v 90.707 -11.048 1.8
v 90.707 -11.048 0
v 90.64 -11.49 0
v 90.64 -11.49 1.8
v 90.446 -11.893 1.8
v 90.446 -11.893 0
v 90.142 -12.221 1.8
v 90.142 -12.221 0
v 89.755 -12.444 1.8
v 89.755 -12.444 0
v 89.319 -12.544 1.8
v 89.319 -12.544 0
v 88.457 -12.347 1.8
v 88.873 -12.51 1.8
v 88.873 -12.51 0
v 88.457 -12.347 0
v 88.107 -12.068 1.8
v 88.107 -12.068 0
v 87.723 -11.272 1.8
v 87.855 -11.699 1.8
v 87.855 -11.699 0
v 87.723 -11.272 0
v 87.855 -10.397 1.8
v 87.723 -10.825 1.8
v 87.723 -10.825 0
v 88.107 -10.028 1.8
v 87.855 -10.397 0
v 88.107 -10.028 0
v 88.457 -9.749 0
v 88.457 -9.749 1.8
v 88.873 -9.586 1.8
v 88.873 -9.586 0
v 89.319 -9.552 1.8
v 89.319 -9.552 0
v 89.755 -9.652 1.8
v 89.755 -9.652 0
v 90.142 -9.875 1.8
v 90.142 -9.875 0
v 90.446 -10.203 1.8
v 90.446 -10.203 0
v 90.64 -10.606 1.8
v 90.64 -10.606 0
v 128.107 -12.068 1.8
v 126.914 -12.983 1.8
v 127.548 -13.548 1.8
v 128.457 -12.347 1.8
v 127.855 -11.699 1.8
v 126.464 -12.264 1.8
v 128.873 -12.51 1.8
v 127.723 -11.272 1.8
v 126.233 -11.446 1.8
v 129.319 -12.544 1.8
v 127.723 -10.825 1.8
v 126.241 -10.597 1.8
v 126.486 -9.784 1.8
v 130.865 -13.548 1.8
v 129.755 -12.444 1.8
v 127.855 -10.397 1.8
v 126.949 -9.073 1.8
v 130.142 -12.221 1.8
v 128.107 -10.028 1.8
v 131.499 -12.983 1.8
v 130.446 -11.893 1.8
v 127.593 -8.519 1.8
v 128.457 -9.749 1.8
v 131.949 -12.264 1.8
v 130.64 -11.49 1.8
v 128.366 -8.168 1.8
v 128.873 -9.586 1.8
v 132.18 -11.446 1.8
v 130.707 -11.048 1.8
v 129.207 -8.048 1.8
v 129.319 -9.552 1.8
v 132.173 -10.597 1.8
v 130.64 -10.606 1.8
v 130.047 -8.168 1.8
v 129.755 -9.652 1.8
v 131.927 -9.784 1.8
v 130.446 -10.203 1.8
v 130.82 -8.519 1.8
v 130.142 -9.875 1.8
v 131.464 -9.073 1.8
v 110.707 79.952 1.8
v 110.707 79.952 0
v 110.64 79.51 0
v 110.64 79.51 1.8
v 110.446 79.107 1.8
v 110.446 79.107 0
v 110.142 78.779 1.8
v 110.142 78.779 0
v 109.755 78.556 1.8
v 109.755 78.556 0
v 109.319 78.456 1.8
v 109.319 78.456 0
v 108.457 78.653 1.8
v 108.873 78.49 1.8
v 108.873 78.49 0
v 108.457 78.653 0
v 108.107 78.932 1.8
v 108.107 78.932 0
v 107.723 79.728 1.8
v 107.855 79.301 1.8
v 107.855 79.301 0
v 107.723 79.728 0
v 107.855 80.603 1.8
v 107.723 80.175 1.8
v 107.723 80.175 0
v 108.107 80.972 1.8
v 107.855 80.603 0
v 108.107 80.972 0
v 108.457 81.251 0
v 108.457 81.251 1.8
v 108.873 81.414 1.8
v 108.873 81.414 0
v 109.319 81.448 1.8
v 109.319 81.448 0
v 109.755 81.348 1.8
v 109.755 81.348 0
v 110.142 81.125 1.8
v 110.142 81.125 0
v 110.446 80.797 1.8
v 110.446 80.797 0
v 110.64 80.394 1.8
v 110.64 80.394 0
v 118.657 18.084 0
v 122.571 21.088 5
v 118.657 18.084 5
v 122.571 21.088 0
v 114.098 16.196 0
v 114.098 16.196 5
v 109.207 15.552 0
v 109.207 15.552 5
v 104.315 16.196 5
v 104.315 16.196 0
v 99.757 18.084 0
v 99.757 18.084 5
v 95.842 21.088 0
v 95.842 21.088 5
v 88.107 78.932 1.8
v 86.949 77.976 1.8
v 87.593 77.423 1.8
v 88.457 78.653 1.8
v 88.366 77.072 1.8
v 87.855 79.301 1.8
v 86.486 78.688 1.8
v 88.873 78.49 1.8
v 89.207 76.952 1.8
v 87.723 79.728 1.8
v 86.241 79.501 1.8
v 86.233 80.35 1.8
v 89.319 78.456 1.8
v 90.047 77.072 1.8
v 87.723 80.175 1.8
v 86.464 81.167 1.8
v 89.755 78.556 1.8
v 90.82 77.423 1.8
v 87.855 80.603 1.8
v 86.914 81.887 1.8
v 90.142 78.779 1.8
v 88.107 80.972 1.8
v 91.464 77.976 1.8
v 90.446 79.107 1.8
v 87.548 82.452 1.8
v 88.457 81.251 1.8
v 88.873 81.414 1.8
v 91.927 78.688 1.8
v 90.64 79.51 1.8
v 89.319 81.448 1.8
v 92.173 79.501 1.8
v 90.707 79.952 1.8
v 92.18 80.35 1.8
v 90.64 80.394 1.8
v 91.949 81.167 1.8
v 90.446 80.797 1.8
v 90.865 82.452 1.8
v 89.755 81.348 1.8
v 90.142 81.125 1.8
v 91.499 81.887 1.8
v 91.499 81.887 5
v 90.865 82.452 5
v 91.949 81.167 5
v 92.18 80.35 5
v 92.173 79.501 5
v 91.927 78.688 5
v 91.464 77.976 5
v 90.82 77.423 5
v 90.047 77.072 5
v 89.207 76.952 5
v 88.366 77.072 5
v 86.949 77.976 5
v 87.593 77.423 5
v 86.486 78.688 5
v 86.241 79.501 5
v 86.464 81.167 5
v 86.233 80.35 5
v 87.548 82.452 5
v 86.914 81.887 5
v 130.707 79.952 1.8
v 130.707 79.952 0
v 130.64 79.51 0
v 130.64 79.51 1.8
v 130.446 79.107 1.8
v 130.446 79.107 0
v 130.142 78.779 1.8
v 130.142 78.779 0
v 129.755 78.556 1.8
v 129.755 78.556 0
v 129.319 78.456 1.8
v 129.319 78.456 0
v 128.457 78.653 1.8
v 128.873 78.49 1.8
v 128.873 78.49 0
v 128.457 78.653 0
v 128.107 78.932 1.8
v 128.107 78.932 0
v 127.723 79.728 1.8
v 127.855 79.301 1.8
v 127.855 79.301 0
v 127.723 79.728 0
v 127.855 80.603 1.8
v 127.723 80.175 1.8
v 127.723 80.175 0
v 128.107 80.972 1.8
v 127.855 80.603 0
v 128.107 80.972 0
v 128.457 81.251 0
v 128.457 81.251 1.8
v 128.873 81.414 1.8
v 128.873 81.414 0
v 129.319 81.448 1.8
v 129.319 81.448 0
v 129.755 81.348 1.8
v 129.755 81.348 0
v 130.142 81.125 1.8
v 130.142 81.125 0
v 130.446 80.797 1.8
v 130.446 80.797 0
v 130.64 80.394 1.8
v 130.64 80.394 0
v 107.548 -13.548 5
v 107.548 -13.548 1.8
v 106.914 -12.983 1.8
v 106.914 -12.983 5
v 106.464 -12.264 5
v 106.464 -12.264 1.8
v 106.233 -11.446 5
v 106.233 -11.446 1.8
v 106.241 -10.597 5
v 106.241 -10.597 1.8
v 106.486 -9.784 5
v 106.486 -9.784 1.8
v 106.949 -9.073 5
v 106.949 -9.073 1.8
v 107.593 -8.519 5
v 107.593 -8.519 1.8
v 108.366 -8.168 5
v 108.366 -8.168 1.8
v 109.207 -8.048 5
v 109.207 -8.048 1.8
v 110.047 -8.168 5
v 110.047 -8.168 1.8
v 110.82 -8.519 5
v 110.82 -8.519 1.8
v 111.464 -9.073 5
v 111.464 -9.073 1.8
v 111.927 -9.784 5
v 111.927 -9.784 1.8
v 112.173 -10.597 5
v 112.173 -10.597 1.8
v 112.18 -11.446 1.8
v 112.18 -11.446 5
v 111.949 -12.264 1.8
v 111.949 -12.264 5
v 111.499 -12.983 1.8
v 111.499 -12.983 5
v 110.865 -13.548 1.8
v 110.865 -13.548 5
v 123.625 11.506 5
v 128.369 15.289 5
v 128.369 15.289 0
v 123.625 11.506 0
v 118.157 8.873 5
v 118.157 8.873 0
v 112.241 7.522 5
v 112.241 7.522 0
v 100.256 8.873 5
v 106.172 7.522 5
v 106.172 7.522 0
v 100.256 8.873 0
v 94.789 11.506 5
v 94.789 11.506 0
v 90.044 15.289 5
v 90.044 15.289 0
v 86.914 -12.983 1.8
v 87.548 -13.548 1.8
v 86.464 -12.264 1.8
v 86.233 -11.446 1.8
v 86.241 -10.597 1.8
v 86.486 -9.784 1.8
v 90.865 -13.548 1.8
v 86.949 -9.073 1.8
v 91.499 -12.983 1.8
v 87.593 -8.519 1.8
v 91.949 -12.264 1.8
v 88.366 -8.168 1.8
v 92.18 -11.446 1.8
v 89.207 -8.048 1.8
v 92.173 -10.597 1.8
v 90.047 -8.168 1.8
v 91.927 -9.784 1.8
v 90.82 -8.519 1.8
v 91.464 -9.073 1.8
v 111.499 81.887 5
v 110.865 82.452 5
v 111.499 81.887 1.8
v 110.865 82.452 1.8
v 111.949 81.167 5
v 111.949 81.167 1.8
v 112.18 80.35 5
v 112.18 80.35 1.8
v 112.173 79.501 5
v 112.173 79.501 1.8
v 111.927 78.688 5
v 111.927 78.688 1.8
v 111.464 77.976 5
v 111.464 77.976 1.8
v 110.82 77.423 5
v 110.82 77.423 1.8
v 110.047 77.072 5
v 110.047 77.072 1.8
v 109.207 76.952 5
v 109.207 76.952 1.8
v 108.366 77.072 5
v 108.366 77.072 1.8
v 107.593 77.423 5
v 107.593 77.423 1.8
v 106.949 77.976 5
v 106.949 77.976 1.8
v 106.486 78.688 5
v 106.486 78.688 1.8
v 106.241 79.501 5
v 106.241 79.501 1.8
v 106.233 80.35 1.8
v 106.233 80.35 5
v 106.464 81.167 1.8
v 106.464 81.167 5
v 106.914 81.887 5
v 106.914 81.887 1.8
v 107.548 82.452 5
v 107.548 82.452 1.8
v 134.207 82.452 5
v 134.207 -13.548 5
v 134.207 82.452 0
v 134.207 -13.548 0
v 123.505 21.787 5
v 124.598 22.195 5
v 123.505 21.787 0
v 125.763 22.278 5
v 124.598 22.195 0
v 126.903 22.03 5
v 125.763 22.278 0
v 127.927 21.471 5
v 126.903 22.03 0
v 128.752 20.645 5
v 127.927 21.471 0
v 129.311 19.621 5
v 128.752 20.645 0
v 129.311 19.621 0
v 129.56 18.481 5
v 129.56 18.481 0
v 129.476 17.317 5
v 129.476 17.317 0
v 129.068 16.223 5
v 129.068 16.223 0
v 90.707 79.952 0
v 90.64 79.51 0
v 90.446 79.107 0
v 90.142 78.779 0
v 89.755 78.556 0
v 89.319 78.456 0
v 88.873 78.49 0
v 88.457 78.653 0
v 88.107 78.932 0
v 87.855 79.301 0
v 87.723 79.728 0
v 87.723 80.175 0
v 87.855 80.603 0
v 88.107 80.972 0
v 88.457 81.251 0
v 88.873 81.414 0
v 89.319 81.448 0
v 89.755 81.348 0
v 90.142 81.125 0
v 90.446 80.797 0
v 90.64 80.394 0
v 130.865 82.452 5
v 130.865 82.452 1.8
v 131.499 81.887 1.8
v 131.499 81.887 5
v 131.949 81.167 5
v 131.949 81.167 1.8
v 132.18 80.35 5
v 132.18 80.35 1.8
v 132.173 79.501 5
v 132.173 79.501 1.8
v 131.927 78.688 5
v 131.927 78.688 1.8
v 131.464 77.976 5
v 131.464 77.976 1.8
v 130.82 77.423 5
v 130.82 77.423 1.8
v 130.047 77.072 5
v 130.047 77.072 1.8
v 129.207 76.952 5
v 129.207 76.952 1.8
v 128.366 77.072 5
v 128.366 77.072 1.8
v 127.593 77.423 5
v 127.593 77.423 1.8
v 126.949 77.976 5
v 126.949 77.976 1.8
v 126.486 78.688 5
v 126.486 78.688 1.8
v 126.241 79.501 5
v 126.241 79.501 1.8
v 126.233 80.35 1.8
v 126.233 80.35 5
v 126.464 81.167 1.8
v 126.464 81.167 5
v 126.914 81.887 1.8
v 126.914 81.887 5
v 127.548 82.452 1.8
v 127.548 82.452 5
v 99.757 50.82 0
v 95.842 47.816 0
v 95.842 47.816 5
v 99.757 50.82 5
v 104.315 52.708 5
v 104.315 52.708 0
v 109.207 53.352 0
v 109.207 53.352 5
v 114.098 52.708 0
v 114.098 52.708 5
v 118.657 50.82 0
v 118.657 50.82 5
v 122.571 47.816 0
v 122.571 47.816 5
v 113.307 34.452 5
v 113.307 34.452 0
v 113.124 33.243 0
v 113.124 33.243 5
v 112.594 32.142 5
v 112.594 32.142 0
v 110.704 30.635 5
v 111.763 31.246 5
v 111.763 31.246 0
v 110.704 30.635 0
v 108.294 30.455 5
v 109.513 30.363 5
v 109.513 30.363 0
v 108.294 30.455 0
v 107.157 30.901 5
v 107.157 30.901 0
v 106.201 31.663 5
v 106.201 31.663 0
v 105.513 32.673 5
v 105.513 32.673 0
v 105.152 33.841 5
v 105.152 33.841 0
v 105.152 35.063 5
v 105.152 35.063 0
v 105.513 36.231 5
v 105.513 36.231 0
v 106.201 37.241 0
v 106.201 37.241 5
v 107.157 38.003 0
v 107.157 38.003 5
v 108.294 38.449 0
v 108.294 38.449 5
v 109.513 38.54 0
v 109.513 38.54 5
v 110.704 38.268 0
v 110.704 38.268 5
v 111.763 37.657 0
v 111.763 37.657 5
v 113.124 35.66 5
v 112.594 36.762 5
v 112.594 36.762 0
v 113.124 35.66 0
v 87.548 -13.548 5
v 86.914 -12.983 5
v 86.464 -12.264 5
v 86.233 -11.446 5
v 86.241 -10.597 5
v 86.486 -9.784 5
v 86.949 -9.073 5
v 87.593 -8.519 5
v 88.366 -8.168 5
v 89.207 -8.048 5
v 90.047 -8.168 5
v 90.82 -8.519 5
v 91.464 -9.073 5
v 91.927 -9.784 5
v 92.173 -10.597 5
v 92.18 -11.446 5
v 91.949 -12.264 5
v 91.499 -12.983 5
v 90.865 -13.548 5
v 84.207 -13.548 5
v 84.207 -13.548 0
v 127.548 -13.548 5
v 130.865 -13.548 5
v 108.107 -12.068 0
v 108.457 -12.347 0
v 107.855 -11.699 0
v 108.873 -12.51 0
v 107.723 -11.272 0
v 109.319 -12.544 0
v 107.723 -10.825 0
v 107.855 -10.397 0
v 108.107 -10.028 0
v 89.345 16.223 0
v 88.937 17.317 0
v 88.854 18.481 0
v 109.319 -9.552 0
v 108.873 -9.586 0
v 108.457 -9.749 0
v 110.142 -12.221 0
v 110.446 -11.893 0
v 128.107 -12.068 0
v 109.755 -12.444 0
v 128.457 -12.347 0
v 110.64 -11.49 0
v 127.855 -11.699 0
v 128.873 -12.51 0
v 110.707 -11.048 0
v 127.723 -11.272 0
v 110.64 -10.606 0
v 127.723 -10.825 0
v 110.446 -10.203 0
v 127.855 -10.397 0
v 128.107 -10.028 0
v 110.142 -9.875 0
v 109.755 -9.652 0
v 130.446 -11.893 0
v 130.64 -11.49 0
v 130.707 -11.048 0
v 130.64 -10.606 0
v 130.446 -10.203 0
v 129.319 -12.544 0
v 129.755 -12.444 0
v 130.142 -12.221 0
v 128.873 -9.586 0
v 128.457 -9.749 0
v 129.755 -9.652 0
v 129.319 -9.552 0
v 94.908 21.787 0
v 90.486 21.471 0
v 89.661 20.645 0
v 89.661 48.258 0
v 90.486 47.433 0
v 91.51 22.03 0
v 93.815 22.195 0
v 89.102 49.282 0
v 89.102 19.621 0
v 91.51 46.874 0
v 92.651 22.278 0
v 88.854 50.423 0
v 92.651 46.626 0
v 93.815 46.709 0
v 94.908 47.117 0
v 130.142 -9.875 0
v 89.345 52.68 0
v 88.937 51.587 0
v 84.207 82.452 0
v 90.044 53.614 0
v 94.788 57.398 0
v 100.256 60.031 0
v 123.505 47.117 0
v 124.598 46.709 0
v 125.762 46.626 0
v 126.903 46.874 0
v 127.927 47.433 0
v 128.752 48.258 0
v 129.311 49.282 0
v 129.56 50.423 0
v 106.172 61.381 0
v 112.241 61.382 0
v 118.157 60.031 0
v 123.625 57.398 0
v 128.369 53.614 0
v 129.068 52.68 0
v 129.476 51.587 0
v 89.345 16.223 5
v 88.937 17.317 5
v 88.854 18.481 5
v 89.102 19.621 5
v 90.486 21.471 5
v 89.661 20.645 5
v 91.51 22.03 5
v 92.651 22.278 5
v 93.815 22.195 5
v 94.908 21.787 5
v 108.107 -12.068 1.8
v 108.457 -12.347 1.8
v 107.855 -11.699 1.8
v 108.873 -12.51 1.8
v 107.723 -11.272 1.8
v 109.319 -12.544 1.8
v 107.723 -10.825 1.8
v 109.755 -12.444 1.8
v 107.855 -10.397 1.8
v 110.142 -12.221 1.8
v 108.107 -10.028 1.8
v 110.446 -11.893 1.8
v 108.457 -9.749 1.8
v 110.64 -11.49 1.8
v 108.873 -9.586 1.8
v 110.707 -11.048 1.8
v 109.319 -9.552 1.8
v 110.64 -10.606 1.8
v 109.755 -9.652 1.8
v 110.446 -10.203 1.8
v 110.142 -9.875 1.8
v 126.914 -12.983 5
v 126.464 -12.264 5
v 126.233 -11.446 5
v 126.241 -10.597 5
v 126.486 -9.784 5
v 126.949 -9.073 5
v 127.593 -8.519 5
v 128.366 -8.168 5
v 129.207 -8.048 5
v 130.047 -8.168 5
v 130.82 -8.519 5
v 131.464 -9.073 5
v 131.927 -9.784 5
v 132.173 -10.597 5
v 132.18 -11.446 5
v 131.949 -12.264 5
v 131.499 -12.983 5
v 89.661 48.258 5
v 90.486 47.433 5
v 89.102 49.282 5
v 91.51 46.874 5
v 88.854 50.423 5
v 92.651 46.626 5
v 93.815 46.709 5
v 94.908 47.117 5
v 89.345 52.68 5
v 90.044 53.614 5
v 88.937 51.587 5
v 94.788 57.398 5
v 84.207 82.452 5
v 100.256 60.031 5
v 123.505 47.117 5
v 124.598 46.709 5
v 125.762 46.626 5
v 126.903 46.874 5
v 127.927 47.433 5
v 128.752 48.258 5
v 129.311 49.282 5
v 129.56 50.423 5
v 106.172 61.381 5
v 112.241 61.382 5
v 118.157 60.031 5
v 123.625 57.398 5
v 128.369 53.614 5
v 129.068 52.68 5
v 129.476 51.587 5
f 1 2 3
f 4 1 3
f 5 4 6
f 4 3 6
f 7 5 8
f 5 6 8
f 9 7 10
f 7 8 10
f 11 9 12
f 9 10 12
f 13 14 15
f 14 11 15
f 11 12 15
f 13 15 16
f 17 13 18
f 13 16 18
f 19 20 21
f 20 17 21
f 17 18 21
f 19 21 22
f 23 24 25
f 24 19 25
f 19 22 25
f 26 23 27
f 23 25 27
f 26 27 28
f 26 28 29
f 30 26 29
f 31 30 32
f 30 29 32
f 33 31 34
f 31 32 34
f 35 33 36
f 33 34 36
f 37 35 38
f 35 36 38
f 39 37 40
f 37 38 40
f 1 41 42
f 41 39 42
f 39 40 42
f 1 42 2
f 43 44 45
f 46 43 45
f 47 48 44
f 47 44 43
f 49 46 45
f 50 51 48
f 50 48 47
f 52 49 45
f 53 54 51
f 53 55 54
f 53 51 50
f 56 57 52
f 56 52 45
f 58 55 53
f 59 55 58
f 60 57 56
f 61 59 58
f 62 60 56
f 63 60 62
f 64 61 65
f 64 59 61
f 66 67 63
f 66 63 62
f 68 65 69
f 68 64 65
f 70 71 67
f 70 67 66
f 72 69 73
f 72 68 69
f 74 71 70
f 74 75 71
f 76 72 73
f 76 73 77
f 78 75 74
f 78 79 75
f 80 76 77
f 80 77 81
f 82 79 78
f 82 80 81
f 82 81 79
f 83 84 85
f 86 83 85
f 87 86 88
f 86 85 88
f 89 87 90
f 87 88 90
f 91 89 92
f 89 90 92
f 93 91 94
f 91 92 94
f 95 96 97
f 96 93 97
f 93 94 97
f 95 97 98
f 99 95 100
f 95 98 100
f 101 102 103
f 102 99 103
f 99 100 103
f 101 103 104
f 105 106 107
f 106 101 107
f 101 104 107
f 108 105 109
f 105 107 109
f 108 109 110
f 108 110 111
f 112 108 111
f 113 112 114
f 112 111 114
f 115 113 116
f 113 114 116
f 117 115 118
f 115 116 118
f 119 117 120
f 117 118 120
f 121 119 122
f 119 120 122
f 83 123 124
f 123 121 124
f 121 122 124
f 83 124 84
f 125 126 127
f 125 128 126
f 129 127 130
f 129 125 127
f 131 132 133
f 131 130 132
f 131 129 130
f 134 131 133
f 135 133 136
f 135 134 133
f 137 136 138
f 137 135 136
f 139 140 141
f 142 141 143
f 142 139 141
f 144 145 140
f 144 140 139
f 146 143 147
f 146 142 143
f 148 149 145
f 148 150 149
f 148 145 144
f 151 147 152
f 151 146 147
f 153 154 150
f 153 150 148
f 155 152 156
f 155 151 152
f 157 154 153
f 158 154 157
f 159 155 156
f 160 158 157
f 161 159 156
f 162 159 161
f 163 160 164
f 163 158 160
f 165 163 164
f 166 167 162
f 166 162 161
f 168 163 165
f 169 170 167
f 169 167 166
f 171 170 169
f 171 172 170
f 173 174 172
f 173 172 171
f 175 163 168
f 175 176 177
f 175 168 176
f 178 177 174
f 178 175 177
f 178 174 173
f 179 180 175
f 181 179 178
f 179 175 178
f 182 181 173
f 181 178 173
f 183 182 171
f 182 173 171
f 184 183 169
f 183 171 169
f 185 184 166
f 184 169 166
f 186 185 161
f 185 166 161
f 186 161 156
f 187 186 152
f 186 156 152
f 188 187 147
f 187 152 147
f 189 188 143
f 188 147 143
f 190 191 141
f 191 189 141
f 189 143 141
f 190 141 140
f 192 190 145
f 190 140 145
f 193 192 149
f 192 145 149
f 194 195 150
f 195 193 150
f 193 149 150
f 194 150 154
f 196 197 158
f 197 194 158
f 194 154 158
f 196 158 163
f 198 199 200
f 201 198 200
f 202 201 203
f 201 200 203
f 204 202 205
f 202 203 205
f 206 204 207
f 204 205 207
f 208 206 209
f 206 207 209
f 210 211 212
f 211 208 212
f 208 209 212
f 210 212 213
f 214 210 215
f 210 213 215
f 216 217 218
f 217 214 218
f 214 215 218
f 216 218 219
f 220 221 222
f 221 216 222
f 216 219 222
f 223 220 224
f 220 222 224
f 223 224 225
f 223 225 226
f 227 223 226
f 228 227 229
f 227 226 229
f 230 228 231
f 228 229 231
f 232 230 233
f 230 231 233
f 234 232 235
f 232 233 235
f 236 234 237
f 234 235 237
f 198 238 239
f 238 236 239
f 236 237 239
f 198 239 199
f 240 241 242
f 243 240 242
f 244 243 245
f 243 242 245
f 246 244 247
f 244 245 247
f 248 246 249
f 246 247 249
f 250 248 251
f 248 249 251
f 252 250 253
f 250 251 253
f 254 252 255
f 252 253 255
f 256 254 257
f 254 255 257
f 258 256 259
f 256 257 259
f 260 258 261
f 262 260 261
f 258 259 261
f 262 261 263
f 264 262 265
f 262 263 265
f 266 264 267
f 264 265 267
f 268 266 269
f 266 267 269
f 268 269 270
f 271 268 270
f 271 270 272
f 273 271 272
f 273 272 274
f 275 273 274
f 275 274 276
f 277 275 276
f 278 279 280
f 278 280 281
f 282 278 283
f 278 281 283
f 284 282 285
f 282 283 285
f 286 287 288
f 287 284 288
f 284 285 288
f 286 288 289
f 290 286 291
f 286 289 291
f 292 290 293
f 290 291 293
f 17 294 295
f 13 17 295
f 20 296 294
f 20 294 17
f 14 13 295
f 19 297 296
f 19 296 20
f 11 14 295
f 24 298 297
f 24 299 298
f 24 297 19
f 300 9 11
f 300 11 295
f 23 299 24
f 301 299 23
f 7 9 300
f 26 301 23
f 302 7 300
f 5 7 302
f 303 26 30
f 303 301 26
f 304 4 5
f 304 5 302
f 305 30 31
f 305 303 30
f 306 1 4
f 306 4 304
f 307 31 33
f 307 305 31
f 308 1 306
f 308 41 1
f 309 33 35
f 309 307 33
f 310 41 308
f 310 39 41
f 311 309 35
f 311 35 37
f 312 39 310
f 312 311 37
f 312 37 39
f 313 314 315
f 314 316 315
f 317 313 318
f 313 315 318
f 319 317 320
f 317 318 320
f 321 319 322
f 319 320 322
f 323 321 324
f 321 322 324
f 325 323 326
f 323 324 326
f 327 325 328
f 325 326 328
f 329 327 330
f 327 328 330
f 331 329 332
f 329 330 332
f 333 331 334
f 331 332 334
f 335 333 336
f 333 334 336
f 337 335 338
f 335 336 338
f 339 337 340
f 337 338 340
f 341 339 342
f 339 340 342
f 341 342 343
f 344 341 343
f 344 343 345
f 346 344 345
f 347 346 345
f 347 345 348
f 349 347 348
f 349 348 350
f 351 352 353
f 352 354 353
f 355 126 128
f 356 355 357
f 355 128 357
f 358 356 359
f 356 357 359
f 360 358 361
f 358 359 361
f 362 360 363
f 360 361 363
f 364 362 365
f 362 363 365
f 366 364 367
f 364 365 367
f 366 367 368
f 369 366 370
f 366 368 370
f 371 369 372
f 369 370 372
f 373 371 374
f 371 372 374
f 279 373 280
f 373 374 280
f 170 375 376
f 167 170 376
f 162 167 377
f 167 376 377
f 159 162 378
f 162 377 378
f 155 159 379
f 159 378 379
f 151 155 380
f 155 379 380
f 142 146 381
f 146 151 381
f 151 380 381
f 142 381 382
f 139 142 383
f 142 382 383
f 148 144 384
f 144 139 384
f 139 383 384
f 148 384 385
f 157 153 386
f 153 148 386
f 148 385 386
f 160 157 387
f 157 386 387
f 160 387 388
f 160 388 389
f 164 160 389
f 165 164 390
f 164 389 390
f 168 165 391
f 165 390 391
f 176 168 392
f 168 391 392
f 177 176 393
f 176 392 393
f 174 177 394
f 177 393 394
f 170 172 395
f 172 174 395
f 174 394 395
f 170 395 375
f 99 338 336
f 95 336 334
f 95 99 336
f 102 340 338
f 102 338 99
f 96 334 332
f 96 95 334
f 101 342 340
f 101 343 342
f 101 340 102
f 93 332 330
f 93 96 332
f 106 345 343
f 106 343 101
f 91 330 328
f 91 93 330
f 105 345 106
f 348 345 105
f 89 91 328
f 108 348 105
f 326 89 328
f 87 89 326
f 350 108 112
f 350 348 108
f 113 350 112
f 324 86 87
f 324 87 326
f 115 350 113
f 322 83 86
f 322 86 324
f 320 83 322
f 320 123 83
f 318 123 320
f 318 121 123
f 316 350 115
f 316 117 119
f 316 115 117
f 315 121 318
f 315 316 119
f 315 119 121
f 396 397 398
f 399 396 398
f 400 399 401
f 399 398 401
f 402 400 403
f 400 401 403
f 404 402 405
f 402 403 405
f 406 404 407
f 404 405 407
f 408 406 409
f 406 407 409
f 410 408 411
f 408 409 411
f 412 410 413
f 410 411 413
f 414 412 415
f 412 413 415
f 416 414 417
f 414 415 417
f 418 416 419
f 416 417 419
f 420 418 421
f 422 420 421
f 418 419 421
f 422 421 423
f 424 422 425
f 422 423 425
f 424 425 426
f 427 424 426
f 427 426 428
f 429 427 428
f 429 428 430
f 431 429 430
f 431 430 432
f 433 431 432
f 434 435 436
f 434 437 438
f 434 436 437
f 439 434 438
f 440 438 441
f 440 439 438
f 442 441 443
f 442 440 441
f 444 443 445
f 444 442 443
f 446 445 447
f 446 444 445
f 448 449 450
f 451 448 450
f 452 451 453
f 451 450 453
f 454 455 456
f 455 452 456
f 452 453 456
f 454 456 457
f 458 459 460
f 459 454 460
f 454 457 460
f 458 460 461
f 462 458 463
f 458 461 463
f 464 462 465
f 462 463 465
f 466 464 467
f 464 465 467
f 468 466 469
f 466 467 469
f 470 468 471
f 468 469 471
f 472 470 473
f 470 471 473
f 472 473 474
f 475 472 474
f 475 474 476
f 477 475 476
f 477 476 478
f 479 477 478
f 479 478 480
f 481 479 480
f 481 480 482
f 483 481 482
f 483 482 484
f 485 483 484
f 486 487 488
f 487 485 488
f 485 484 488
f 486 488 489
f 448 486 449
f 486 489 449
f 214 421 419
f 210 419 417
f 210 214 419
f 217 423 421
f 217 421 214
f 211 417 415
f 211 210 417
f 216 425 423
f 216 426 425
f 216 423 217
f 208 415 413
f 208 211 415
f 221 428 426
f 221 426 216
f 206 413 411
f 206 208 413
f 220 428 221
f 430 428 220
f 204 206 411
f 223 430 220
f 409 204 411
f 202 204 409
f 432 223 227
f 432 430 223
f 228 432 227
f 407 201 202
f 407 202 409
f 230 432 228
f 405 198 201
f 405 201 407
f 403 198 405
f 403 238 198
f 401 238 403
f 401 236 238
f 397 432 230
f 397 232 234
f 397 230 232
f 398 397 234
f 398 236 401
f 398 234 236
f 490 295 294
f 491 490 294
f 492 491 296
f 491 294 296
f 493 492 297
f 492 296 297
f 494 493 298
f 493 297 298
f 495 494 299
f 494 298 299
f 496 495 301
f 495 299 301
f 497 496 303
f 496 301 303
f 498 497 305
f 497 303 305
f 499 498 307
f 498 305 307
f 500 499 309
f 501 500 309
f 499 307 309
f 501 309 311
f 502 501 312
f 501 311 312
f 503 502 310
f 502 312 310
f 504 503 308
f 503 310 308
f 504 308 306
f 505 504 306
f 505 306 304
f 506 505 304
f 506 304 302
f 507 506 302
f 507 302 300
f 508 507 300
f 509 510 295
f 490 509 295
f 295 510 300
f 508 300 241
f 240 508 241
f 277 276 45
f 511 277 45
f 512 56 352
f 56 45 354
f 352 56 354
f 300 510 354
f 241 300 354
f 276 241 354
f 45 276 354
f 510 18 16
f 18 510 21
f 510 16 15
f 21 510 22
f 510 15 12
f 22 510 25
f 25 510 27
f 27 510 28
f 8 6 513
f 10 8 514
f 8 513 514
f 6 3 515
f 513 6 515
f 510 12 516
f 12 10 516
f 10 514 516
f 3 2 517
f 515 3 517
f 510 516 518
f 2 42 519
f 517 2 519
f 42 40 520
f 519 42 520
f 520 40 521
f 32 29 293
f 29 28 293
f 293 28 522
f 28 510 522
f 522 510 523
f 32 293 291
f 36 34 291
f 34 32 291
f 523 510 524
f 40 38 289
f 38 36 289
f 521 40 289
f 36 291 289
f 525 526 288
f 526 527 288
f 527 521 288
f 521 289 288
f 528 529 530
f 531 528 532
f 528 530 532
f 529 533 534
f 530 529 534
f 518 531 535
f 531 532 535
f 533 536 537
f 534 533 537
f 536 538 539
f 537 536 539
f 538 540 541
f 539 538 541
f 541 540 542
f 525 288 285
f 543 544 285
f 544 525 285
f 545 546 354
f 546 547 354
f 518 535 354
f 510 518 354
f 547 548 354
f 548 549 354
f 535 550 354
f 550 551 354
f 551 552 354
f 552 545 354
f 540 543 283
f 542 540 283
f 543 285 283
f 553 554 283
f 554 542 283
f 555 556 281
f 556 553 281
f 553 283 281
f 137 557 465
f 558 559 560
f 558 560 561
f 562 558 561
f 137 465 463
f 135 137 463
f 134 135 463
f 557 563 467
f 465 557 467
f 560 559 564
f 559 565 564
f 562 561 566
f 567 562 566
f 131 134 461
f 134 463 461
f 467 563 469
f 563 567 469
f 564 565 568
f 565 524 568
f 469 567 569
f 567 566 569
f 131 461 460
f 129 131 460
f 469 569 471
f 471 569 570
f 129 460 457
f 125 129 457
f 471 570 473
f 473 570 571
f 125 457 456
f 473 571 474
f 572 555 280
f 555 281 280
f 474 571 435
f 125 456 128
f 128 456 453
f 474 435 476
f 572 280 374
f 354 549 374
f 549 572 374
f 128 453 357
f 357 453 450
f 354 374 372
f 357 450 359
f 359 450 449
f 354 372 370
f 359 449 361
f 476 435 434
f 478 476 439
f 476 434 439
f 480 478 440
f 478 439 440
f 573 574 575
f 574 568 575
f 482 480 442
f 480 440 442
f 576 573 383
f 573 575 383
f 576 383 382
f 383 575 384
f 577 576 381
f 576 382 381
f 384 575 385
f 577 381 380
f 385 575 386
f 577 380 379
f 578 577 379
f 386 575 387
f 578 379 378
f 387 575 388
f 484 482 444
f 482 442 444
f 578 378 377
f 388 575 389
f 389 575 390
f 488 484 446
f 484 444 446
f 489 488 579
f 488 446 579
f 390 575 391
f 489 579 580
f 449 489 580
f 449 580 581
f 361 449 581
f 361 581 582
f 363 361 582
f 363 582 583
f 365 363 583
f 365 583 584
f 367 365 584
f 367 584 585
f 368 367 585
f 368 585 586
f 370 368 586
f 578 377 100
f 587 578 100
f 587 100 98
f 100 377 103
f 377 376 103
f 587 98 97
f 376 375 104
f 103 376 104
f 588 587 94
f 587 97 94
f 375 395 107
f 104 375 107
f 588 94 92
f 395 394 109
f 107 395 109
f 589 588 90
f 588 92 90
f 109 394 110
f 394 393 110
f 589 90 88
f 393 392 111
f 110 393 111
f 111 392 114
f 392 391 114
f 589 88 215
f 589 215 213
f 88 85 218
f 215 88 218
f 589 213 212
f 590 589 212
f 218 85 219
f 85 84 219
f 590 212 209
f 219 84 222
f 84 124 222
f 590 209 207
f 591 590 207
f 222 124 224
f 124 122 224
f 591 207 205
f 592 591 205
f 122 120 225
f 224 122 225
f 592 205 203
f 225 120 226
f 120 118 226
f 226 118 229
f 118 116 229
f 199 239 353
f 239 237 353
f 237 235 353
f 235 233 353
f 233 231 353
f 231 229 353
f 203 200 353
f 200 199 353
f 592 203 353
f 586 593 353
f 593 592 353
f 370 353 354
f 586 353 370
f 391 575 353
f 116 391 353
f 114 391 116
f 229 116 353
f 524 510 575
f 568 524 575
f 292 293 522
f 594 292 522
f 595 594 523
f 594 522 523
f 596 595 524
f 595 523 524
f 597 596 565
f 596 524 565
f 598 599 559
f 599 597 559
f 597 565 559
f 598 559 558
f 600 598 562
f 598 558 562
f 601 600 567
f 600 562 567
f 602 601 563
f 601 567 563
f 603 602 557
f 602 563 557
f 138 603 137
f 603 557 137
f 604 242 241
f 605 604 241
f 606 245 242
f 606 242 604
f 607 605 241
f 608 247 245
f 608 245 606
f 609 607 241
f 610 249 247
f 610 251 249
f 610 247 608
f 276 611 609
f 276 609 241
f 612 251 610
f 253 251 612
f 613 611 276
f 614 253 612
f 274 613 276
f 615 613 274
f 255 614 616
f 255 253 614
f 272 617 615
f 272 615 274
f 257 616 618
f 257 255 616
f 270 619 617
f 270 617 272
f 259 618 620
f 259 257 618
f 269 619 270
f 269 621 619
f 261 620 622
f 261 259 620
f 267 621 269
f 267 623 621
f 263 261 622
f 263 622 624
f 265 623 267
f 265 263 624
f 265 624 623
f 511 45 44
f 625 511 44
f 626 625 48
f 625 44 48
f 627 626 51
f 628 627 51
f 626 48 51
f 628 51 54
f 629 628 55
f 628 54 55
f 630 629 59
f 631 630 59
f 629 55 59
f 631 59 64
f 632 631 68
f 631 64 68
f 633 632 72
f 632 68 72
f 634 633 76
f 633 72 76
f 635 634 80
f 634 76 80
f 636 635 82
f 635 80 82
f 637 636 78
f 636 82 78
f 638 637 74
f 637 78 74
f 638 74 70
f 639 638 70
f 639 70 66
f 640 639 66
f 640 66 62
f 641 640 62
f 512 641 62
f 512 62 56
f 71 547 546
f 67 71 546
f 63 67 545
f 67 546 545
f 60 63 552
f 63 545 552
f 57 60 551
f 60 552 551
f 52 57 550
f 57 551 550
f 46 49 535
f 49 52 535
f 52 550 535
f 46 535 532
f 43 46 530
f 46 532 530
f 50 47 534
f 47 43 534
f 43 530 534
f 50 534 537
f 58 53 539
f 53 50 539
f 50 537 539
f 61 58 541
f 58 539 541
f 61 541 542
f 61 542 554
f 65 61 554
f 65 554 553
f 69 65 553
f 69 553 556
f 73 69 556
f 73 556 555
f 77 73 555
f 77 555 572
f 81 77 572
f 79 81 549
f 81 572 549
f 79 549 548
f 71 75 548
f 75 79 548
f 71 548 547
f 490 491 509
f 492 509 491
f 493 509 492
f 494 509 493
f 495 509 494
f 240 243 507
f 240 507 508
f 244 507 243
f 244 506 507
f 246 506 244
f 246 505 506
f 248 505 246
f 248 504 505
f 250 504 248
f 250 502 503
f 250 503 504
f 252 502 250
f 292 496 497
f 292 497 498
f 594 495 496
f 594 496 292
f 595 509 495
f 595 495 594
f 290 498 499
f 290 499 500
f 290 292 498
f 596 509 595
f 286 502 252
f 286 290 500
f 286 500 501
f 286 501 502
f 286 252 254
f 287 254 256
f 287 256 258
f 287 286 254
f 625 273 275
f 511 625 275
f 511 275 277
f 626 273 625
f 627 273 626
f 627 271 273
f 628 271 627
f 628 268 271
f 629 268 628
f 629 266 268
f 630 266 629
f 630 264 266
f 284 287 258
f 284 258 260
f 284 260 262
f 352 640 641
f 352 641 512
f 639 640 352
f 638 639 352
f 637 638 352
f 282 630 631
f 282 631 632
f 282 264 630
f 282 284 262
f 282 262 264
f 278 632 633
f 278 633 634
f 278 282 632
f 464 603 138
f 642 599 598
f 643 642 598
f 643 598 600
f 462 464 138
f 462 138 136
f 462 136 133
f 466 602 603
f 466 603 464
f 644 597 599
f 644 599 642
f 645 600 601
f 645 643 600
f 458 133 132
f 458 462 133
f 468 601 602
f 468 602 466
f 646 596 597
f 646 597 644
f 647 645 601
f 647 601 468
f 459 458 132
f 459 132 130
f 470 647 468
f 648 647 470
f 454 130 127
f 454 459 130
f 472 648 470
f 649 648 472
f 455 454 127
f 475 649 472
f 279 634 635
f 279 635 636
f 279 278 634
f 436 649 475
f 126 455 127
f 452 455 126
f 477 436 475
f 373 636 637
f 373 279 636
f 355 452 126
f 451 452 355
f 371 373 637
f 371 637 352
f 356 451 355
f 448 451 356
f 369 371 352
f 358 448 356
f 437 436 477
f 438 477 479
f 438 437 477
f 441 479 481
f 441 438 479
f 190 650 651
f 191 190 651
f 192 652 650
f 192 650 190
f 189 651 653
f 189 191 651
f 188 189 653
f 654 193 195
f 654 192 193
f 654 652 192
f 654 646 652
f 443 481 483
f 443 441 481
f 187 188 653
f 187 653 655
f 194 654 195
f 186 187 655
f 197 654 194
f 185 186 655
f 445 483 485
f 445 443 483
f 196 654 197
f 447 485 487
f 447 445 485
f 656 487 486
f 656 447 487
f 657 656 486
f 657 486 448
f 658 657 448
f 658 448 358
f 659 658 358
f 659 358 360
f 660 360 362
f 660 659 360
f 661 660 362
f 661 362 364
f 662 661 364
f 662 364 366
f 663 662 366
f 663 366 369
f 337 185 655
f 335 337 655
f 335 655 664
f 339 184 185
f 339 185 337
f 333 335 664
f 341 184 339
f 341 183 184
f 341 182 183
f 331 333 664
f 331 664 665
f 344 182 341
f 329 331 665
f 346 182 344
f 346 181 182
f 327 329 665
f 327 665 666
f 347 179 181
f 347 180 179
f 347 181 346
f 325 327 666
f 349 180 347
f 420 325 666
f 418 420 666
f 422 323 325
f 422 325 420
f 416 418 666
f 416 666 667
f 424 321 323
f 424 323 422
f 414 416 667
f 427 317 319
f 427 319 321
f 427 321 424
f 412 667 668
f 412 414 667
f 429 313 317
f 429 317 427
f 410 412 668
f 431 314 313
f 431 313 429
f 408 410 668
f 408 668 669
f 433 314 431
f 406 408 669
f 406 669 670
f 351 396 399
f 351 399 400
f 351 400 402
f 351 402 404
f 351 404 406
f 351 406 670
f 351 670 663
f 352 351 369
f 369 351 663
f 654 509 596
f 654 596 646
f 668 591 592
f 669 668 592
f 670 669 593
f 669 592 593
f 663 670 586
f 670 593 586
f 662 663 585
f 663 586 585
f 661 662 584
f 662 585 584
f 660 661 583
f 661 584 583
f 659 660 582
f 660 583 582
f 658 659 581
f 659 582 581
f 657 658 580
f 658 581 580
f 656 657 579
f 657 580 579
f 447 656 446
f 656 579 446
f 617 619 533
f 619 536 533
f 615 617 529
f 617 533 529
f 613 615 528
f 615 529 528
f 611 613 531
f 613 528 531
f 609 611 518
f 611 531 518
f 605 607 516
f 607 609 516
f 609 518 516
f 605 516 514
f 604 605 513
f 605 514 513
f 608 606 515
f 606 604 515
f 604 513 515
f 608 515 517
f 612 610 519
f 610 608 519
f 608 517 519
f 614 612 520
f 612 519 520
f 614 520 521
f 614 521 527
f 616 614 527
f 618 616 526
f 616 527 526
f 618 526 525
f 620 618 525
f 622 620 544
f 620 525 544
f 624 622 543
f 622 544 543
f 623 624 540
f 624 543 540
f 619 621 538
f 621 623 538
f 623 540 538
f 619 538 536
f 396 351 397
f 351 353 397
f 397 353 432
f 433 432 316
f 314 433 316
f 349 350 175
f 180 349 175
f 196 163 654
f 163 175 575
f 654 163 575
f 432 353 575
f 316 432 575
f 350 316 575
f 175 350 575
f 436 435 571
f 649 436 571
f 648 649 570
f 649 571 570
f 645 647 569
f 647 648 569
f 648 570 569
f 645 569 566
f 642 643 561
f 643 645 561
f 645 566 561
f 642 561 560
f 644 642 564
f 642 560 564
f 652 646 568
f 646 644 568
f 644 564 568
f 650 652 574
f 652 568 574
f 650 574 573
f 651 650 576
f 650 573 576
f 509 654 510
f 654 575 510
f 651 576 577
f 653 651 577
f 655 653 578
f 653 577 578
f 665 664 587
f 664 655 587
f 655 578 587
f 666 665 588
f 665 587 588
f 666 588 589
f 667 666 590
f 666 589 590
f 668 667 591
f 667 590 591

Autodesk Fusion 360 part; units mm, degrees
sketch "Schizzo5" plane through (0, 0, 0) normal (0, 0, 1) x (1, 0, 0)
  line L0 (84.2066, 82.4519) -> (84.2066, -13.5481)
  circle A0 centre (89.2066, -11.0481) radius 1.5
  circle A1 centre (129.2066, 79.9519) radius 3
  line L1 (84.2066, 34.4519) -> (134.2066, 34.4519) construction
  circle A2 centre (109.2066, 79.9519) radius 1.5
  circle A3 centre (89.2066, 79.9519) radius 3
  circle A4 centre (89.2066, 79.9519) radius 1.5
  line L2 (134.2066, 82.4519) -> (84.2066, 82.4519)
  circle A5 centre (129.2066, 79.9519) radius 1.5
  circle A6 centre (109.2066, 79.9519) radius 3
  circle A7 centre (109.2066, 34.4519) radius 4.1
  circle A8 centre (109.2066, -11.0481) radius 1.5
  line L3 (134.2066, -13.5481) -> (134.2066, 82.4519)
  line L4 (89.2066, 82.4519) -> (89.2066, -13.5481) construction
  circle A9 centre (89.2066, -11.0481) radius 3
  circle A10 centre (109.2066, -11.0481) radius 3
  circle A11 centre (129.2066, -11.0481) radius 1.5
  line L5 (84.2066, -13.5481) -> (134.2066, -13.5481)
  circle A12 centre (129.2066, -11.0481) radius 3
  line L6 (84.2066, -11.0481) -> (134.2066, -11.0481) construction
  line L7 (109.2066, 82.4519) -> (109.2066, -13.5481) construction
  line L8 (109.2066, 34.4519) -> (109.2066, 59.4519) construction
  line L9 (109.2066, 34.4519) -> (109.2066, 59.4519) construction
  line L10 (109.2066, 34.4519) -> (92.9431, 18.1884) construction
  circle A13 centre (92.9431, 18.1884) radius 4.1
  circle A14 centre (92.9431, 50.7153) radius 4.1
  circle A15 centre (125.47, 50.7153) radius 4.1
  circle A16 centre (125.47, 18.1884) radius 4.1
  circle A17 centre (109.2066, 34.4519) radius 18.9
  circle A18 centre (109.2066, 34.4519) radius 27.1
  point P0 (127.8474, 12.2366)
  dimension "d221" = 50
  dimension "d222" = 96
  dimension "d223" = 2.5
  dimension "d224" = 20
  dimension "d225" = 3
  dimension "d226" = 6
  dimension "d227" = 3
  dimension "d228" = 6
  dimension "d229" = 8.2
  dimension "d350" = 8.2
  dimension "d351" = 45
  dimension "d352" = 23
extrude "Estrusione24" add sketch "Schizzo5" along normal blind 5 contours L0 A1 A3 L2 A6 L3 A18 | L0 A13 A14 A17 A18 | L0 L3 A9 A10 L5 A12 A18 | A17 | L3 A15 A16 A17 A18
extrude "Estrusione25" add sketch "Schizzo5" along normal blind 1.8 contours A3 L2 | L2 A6 | A9 L5 | A1 L2 | A10 L5 | L5 A12 picked at (89.244, 82.1172) picked at (109.244, 82.1172) picked at (89.244, -13.2134) picked at (129.244, 82.1172) picked at (109.244, -13.2134) picked at (129.244, -13.2134)
equation "d225 = d227"
equation "d226 = d228"
equation "d350 = d229"
